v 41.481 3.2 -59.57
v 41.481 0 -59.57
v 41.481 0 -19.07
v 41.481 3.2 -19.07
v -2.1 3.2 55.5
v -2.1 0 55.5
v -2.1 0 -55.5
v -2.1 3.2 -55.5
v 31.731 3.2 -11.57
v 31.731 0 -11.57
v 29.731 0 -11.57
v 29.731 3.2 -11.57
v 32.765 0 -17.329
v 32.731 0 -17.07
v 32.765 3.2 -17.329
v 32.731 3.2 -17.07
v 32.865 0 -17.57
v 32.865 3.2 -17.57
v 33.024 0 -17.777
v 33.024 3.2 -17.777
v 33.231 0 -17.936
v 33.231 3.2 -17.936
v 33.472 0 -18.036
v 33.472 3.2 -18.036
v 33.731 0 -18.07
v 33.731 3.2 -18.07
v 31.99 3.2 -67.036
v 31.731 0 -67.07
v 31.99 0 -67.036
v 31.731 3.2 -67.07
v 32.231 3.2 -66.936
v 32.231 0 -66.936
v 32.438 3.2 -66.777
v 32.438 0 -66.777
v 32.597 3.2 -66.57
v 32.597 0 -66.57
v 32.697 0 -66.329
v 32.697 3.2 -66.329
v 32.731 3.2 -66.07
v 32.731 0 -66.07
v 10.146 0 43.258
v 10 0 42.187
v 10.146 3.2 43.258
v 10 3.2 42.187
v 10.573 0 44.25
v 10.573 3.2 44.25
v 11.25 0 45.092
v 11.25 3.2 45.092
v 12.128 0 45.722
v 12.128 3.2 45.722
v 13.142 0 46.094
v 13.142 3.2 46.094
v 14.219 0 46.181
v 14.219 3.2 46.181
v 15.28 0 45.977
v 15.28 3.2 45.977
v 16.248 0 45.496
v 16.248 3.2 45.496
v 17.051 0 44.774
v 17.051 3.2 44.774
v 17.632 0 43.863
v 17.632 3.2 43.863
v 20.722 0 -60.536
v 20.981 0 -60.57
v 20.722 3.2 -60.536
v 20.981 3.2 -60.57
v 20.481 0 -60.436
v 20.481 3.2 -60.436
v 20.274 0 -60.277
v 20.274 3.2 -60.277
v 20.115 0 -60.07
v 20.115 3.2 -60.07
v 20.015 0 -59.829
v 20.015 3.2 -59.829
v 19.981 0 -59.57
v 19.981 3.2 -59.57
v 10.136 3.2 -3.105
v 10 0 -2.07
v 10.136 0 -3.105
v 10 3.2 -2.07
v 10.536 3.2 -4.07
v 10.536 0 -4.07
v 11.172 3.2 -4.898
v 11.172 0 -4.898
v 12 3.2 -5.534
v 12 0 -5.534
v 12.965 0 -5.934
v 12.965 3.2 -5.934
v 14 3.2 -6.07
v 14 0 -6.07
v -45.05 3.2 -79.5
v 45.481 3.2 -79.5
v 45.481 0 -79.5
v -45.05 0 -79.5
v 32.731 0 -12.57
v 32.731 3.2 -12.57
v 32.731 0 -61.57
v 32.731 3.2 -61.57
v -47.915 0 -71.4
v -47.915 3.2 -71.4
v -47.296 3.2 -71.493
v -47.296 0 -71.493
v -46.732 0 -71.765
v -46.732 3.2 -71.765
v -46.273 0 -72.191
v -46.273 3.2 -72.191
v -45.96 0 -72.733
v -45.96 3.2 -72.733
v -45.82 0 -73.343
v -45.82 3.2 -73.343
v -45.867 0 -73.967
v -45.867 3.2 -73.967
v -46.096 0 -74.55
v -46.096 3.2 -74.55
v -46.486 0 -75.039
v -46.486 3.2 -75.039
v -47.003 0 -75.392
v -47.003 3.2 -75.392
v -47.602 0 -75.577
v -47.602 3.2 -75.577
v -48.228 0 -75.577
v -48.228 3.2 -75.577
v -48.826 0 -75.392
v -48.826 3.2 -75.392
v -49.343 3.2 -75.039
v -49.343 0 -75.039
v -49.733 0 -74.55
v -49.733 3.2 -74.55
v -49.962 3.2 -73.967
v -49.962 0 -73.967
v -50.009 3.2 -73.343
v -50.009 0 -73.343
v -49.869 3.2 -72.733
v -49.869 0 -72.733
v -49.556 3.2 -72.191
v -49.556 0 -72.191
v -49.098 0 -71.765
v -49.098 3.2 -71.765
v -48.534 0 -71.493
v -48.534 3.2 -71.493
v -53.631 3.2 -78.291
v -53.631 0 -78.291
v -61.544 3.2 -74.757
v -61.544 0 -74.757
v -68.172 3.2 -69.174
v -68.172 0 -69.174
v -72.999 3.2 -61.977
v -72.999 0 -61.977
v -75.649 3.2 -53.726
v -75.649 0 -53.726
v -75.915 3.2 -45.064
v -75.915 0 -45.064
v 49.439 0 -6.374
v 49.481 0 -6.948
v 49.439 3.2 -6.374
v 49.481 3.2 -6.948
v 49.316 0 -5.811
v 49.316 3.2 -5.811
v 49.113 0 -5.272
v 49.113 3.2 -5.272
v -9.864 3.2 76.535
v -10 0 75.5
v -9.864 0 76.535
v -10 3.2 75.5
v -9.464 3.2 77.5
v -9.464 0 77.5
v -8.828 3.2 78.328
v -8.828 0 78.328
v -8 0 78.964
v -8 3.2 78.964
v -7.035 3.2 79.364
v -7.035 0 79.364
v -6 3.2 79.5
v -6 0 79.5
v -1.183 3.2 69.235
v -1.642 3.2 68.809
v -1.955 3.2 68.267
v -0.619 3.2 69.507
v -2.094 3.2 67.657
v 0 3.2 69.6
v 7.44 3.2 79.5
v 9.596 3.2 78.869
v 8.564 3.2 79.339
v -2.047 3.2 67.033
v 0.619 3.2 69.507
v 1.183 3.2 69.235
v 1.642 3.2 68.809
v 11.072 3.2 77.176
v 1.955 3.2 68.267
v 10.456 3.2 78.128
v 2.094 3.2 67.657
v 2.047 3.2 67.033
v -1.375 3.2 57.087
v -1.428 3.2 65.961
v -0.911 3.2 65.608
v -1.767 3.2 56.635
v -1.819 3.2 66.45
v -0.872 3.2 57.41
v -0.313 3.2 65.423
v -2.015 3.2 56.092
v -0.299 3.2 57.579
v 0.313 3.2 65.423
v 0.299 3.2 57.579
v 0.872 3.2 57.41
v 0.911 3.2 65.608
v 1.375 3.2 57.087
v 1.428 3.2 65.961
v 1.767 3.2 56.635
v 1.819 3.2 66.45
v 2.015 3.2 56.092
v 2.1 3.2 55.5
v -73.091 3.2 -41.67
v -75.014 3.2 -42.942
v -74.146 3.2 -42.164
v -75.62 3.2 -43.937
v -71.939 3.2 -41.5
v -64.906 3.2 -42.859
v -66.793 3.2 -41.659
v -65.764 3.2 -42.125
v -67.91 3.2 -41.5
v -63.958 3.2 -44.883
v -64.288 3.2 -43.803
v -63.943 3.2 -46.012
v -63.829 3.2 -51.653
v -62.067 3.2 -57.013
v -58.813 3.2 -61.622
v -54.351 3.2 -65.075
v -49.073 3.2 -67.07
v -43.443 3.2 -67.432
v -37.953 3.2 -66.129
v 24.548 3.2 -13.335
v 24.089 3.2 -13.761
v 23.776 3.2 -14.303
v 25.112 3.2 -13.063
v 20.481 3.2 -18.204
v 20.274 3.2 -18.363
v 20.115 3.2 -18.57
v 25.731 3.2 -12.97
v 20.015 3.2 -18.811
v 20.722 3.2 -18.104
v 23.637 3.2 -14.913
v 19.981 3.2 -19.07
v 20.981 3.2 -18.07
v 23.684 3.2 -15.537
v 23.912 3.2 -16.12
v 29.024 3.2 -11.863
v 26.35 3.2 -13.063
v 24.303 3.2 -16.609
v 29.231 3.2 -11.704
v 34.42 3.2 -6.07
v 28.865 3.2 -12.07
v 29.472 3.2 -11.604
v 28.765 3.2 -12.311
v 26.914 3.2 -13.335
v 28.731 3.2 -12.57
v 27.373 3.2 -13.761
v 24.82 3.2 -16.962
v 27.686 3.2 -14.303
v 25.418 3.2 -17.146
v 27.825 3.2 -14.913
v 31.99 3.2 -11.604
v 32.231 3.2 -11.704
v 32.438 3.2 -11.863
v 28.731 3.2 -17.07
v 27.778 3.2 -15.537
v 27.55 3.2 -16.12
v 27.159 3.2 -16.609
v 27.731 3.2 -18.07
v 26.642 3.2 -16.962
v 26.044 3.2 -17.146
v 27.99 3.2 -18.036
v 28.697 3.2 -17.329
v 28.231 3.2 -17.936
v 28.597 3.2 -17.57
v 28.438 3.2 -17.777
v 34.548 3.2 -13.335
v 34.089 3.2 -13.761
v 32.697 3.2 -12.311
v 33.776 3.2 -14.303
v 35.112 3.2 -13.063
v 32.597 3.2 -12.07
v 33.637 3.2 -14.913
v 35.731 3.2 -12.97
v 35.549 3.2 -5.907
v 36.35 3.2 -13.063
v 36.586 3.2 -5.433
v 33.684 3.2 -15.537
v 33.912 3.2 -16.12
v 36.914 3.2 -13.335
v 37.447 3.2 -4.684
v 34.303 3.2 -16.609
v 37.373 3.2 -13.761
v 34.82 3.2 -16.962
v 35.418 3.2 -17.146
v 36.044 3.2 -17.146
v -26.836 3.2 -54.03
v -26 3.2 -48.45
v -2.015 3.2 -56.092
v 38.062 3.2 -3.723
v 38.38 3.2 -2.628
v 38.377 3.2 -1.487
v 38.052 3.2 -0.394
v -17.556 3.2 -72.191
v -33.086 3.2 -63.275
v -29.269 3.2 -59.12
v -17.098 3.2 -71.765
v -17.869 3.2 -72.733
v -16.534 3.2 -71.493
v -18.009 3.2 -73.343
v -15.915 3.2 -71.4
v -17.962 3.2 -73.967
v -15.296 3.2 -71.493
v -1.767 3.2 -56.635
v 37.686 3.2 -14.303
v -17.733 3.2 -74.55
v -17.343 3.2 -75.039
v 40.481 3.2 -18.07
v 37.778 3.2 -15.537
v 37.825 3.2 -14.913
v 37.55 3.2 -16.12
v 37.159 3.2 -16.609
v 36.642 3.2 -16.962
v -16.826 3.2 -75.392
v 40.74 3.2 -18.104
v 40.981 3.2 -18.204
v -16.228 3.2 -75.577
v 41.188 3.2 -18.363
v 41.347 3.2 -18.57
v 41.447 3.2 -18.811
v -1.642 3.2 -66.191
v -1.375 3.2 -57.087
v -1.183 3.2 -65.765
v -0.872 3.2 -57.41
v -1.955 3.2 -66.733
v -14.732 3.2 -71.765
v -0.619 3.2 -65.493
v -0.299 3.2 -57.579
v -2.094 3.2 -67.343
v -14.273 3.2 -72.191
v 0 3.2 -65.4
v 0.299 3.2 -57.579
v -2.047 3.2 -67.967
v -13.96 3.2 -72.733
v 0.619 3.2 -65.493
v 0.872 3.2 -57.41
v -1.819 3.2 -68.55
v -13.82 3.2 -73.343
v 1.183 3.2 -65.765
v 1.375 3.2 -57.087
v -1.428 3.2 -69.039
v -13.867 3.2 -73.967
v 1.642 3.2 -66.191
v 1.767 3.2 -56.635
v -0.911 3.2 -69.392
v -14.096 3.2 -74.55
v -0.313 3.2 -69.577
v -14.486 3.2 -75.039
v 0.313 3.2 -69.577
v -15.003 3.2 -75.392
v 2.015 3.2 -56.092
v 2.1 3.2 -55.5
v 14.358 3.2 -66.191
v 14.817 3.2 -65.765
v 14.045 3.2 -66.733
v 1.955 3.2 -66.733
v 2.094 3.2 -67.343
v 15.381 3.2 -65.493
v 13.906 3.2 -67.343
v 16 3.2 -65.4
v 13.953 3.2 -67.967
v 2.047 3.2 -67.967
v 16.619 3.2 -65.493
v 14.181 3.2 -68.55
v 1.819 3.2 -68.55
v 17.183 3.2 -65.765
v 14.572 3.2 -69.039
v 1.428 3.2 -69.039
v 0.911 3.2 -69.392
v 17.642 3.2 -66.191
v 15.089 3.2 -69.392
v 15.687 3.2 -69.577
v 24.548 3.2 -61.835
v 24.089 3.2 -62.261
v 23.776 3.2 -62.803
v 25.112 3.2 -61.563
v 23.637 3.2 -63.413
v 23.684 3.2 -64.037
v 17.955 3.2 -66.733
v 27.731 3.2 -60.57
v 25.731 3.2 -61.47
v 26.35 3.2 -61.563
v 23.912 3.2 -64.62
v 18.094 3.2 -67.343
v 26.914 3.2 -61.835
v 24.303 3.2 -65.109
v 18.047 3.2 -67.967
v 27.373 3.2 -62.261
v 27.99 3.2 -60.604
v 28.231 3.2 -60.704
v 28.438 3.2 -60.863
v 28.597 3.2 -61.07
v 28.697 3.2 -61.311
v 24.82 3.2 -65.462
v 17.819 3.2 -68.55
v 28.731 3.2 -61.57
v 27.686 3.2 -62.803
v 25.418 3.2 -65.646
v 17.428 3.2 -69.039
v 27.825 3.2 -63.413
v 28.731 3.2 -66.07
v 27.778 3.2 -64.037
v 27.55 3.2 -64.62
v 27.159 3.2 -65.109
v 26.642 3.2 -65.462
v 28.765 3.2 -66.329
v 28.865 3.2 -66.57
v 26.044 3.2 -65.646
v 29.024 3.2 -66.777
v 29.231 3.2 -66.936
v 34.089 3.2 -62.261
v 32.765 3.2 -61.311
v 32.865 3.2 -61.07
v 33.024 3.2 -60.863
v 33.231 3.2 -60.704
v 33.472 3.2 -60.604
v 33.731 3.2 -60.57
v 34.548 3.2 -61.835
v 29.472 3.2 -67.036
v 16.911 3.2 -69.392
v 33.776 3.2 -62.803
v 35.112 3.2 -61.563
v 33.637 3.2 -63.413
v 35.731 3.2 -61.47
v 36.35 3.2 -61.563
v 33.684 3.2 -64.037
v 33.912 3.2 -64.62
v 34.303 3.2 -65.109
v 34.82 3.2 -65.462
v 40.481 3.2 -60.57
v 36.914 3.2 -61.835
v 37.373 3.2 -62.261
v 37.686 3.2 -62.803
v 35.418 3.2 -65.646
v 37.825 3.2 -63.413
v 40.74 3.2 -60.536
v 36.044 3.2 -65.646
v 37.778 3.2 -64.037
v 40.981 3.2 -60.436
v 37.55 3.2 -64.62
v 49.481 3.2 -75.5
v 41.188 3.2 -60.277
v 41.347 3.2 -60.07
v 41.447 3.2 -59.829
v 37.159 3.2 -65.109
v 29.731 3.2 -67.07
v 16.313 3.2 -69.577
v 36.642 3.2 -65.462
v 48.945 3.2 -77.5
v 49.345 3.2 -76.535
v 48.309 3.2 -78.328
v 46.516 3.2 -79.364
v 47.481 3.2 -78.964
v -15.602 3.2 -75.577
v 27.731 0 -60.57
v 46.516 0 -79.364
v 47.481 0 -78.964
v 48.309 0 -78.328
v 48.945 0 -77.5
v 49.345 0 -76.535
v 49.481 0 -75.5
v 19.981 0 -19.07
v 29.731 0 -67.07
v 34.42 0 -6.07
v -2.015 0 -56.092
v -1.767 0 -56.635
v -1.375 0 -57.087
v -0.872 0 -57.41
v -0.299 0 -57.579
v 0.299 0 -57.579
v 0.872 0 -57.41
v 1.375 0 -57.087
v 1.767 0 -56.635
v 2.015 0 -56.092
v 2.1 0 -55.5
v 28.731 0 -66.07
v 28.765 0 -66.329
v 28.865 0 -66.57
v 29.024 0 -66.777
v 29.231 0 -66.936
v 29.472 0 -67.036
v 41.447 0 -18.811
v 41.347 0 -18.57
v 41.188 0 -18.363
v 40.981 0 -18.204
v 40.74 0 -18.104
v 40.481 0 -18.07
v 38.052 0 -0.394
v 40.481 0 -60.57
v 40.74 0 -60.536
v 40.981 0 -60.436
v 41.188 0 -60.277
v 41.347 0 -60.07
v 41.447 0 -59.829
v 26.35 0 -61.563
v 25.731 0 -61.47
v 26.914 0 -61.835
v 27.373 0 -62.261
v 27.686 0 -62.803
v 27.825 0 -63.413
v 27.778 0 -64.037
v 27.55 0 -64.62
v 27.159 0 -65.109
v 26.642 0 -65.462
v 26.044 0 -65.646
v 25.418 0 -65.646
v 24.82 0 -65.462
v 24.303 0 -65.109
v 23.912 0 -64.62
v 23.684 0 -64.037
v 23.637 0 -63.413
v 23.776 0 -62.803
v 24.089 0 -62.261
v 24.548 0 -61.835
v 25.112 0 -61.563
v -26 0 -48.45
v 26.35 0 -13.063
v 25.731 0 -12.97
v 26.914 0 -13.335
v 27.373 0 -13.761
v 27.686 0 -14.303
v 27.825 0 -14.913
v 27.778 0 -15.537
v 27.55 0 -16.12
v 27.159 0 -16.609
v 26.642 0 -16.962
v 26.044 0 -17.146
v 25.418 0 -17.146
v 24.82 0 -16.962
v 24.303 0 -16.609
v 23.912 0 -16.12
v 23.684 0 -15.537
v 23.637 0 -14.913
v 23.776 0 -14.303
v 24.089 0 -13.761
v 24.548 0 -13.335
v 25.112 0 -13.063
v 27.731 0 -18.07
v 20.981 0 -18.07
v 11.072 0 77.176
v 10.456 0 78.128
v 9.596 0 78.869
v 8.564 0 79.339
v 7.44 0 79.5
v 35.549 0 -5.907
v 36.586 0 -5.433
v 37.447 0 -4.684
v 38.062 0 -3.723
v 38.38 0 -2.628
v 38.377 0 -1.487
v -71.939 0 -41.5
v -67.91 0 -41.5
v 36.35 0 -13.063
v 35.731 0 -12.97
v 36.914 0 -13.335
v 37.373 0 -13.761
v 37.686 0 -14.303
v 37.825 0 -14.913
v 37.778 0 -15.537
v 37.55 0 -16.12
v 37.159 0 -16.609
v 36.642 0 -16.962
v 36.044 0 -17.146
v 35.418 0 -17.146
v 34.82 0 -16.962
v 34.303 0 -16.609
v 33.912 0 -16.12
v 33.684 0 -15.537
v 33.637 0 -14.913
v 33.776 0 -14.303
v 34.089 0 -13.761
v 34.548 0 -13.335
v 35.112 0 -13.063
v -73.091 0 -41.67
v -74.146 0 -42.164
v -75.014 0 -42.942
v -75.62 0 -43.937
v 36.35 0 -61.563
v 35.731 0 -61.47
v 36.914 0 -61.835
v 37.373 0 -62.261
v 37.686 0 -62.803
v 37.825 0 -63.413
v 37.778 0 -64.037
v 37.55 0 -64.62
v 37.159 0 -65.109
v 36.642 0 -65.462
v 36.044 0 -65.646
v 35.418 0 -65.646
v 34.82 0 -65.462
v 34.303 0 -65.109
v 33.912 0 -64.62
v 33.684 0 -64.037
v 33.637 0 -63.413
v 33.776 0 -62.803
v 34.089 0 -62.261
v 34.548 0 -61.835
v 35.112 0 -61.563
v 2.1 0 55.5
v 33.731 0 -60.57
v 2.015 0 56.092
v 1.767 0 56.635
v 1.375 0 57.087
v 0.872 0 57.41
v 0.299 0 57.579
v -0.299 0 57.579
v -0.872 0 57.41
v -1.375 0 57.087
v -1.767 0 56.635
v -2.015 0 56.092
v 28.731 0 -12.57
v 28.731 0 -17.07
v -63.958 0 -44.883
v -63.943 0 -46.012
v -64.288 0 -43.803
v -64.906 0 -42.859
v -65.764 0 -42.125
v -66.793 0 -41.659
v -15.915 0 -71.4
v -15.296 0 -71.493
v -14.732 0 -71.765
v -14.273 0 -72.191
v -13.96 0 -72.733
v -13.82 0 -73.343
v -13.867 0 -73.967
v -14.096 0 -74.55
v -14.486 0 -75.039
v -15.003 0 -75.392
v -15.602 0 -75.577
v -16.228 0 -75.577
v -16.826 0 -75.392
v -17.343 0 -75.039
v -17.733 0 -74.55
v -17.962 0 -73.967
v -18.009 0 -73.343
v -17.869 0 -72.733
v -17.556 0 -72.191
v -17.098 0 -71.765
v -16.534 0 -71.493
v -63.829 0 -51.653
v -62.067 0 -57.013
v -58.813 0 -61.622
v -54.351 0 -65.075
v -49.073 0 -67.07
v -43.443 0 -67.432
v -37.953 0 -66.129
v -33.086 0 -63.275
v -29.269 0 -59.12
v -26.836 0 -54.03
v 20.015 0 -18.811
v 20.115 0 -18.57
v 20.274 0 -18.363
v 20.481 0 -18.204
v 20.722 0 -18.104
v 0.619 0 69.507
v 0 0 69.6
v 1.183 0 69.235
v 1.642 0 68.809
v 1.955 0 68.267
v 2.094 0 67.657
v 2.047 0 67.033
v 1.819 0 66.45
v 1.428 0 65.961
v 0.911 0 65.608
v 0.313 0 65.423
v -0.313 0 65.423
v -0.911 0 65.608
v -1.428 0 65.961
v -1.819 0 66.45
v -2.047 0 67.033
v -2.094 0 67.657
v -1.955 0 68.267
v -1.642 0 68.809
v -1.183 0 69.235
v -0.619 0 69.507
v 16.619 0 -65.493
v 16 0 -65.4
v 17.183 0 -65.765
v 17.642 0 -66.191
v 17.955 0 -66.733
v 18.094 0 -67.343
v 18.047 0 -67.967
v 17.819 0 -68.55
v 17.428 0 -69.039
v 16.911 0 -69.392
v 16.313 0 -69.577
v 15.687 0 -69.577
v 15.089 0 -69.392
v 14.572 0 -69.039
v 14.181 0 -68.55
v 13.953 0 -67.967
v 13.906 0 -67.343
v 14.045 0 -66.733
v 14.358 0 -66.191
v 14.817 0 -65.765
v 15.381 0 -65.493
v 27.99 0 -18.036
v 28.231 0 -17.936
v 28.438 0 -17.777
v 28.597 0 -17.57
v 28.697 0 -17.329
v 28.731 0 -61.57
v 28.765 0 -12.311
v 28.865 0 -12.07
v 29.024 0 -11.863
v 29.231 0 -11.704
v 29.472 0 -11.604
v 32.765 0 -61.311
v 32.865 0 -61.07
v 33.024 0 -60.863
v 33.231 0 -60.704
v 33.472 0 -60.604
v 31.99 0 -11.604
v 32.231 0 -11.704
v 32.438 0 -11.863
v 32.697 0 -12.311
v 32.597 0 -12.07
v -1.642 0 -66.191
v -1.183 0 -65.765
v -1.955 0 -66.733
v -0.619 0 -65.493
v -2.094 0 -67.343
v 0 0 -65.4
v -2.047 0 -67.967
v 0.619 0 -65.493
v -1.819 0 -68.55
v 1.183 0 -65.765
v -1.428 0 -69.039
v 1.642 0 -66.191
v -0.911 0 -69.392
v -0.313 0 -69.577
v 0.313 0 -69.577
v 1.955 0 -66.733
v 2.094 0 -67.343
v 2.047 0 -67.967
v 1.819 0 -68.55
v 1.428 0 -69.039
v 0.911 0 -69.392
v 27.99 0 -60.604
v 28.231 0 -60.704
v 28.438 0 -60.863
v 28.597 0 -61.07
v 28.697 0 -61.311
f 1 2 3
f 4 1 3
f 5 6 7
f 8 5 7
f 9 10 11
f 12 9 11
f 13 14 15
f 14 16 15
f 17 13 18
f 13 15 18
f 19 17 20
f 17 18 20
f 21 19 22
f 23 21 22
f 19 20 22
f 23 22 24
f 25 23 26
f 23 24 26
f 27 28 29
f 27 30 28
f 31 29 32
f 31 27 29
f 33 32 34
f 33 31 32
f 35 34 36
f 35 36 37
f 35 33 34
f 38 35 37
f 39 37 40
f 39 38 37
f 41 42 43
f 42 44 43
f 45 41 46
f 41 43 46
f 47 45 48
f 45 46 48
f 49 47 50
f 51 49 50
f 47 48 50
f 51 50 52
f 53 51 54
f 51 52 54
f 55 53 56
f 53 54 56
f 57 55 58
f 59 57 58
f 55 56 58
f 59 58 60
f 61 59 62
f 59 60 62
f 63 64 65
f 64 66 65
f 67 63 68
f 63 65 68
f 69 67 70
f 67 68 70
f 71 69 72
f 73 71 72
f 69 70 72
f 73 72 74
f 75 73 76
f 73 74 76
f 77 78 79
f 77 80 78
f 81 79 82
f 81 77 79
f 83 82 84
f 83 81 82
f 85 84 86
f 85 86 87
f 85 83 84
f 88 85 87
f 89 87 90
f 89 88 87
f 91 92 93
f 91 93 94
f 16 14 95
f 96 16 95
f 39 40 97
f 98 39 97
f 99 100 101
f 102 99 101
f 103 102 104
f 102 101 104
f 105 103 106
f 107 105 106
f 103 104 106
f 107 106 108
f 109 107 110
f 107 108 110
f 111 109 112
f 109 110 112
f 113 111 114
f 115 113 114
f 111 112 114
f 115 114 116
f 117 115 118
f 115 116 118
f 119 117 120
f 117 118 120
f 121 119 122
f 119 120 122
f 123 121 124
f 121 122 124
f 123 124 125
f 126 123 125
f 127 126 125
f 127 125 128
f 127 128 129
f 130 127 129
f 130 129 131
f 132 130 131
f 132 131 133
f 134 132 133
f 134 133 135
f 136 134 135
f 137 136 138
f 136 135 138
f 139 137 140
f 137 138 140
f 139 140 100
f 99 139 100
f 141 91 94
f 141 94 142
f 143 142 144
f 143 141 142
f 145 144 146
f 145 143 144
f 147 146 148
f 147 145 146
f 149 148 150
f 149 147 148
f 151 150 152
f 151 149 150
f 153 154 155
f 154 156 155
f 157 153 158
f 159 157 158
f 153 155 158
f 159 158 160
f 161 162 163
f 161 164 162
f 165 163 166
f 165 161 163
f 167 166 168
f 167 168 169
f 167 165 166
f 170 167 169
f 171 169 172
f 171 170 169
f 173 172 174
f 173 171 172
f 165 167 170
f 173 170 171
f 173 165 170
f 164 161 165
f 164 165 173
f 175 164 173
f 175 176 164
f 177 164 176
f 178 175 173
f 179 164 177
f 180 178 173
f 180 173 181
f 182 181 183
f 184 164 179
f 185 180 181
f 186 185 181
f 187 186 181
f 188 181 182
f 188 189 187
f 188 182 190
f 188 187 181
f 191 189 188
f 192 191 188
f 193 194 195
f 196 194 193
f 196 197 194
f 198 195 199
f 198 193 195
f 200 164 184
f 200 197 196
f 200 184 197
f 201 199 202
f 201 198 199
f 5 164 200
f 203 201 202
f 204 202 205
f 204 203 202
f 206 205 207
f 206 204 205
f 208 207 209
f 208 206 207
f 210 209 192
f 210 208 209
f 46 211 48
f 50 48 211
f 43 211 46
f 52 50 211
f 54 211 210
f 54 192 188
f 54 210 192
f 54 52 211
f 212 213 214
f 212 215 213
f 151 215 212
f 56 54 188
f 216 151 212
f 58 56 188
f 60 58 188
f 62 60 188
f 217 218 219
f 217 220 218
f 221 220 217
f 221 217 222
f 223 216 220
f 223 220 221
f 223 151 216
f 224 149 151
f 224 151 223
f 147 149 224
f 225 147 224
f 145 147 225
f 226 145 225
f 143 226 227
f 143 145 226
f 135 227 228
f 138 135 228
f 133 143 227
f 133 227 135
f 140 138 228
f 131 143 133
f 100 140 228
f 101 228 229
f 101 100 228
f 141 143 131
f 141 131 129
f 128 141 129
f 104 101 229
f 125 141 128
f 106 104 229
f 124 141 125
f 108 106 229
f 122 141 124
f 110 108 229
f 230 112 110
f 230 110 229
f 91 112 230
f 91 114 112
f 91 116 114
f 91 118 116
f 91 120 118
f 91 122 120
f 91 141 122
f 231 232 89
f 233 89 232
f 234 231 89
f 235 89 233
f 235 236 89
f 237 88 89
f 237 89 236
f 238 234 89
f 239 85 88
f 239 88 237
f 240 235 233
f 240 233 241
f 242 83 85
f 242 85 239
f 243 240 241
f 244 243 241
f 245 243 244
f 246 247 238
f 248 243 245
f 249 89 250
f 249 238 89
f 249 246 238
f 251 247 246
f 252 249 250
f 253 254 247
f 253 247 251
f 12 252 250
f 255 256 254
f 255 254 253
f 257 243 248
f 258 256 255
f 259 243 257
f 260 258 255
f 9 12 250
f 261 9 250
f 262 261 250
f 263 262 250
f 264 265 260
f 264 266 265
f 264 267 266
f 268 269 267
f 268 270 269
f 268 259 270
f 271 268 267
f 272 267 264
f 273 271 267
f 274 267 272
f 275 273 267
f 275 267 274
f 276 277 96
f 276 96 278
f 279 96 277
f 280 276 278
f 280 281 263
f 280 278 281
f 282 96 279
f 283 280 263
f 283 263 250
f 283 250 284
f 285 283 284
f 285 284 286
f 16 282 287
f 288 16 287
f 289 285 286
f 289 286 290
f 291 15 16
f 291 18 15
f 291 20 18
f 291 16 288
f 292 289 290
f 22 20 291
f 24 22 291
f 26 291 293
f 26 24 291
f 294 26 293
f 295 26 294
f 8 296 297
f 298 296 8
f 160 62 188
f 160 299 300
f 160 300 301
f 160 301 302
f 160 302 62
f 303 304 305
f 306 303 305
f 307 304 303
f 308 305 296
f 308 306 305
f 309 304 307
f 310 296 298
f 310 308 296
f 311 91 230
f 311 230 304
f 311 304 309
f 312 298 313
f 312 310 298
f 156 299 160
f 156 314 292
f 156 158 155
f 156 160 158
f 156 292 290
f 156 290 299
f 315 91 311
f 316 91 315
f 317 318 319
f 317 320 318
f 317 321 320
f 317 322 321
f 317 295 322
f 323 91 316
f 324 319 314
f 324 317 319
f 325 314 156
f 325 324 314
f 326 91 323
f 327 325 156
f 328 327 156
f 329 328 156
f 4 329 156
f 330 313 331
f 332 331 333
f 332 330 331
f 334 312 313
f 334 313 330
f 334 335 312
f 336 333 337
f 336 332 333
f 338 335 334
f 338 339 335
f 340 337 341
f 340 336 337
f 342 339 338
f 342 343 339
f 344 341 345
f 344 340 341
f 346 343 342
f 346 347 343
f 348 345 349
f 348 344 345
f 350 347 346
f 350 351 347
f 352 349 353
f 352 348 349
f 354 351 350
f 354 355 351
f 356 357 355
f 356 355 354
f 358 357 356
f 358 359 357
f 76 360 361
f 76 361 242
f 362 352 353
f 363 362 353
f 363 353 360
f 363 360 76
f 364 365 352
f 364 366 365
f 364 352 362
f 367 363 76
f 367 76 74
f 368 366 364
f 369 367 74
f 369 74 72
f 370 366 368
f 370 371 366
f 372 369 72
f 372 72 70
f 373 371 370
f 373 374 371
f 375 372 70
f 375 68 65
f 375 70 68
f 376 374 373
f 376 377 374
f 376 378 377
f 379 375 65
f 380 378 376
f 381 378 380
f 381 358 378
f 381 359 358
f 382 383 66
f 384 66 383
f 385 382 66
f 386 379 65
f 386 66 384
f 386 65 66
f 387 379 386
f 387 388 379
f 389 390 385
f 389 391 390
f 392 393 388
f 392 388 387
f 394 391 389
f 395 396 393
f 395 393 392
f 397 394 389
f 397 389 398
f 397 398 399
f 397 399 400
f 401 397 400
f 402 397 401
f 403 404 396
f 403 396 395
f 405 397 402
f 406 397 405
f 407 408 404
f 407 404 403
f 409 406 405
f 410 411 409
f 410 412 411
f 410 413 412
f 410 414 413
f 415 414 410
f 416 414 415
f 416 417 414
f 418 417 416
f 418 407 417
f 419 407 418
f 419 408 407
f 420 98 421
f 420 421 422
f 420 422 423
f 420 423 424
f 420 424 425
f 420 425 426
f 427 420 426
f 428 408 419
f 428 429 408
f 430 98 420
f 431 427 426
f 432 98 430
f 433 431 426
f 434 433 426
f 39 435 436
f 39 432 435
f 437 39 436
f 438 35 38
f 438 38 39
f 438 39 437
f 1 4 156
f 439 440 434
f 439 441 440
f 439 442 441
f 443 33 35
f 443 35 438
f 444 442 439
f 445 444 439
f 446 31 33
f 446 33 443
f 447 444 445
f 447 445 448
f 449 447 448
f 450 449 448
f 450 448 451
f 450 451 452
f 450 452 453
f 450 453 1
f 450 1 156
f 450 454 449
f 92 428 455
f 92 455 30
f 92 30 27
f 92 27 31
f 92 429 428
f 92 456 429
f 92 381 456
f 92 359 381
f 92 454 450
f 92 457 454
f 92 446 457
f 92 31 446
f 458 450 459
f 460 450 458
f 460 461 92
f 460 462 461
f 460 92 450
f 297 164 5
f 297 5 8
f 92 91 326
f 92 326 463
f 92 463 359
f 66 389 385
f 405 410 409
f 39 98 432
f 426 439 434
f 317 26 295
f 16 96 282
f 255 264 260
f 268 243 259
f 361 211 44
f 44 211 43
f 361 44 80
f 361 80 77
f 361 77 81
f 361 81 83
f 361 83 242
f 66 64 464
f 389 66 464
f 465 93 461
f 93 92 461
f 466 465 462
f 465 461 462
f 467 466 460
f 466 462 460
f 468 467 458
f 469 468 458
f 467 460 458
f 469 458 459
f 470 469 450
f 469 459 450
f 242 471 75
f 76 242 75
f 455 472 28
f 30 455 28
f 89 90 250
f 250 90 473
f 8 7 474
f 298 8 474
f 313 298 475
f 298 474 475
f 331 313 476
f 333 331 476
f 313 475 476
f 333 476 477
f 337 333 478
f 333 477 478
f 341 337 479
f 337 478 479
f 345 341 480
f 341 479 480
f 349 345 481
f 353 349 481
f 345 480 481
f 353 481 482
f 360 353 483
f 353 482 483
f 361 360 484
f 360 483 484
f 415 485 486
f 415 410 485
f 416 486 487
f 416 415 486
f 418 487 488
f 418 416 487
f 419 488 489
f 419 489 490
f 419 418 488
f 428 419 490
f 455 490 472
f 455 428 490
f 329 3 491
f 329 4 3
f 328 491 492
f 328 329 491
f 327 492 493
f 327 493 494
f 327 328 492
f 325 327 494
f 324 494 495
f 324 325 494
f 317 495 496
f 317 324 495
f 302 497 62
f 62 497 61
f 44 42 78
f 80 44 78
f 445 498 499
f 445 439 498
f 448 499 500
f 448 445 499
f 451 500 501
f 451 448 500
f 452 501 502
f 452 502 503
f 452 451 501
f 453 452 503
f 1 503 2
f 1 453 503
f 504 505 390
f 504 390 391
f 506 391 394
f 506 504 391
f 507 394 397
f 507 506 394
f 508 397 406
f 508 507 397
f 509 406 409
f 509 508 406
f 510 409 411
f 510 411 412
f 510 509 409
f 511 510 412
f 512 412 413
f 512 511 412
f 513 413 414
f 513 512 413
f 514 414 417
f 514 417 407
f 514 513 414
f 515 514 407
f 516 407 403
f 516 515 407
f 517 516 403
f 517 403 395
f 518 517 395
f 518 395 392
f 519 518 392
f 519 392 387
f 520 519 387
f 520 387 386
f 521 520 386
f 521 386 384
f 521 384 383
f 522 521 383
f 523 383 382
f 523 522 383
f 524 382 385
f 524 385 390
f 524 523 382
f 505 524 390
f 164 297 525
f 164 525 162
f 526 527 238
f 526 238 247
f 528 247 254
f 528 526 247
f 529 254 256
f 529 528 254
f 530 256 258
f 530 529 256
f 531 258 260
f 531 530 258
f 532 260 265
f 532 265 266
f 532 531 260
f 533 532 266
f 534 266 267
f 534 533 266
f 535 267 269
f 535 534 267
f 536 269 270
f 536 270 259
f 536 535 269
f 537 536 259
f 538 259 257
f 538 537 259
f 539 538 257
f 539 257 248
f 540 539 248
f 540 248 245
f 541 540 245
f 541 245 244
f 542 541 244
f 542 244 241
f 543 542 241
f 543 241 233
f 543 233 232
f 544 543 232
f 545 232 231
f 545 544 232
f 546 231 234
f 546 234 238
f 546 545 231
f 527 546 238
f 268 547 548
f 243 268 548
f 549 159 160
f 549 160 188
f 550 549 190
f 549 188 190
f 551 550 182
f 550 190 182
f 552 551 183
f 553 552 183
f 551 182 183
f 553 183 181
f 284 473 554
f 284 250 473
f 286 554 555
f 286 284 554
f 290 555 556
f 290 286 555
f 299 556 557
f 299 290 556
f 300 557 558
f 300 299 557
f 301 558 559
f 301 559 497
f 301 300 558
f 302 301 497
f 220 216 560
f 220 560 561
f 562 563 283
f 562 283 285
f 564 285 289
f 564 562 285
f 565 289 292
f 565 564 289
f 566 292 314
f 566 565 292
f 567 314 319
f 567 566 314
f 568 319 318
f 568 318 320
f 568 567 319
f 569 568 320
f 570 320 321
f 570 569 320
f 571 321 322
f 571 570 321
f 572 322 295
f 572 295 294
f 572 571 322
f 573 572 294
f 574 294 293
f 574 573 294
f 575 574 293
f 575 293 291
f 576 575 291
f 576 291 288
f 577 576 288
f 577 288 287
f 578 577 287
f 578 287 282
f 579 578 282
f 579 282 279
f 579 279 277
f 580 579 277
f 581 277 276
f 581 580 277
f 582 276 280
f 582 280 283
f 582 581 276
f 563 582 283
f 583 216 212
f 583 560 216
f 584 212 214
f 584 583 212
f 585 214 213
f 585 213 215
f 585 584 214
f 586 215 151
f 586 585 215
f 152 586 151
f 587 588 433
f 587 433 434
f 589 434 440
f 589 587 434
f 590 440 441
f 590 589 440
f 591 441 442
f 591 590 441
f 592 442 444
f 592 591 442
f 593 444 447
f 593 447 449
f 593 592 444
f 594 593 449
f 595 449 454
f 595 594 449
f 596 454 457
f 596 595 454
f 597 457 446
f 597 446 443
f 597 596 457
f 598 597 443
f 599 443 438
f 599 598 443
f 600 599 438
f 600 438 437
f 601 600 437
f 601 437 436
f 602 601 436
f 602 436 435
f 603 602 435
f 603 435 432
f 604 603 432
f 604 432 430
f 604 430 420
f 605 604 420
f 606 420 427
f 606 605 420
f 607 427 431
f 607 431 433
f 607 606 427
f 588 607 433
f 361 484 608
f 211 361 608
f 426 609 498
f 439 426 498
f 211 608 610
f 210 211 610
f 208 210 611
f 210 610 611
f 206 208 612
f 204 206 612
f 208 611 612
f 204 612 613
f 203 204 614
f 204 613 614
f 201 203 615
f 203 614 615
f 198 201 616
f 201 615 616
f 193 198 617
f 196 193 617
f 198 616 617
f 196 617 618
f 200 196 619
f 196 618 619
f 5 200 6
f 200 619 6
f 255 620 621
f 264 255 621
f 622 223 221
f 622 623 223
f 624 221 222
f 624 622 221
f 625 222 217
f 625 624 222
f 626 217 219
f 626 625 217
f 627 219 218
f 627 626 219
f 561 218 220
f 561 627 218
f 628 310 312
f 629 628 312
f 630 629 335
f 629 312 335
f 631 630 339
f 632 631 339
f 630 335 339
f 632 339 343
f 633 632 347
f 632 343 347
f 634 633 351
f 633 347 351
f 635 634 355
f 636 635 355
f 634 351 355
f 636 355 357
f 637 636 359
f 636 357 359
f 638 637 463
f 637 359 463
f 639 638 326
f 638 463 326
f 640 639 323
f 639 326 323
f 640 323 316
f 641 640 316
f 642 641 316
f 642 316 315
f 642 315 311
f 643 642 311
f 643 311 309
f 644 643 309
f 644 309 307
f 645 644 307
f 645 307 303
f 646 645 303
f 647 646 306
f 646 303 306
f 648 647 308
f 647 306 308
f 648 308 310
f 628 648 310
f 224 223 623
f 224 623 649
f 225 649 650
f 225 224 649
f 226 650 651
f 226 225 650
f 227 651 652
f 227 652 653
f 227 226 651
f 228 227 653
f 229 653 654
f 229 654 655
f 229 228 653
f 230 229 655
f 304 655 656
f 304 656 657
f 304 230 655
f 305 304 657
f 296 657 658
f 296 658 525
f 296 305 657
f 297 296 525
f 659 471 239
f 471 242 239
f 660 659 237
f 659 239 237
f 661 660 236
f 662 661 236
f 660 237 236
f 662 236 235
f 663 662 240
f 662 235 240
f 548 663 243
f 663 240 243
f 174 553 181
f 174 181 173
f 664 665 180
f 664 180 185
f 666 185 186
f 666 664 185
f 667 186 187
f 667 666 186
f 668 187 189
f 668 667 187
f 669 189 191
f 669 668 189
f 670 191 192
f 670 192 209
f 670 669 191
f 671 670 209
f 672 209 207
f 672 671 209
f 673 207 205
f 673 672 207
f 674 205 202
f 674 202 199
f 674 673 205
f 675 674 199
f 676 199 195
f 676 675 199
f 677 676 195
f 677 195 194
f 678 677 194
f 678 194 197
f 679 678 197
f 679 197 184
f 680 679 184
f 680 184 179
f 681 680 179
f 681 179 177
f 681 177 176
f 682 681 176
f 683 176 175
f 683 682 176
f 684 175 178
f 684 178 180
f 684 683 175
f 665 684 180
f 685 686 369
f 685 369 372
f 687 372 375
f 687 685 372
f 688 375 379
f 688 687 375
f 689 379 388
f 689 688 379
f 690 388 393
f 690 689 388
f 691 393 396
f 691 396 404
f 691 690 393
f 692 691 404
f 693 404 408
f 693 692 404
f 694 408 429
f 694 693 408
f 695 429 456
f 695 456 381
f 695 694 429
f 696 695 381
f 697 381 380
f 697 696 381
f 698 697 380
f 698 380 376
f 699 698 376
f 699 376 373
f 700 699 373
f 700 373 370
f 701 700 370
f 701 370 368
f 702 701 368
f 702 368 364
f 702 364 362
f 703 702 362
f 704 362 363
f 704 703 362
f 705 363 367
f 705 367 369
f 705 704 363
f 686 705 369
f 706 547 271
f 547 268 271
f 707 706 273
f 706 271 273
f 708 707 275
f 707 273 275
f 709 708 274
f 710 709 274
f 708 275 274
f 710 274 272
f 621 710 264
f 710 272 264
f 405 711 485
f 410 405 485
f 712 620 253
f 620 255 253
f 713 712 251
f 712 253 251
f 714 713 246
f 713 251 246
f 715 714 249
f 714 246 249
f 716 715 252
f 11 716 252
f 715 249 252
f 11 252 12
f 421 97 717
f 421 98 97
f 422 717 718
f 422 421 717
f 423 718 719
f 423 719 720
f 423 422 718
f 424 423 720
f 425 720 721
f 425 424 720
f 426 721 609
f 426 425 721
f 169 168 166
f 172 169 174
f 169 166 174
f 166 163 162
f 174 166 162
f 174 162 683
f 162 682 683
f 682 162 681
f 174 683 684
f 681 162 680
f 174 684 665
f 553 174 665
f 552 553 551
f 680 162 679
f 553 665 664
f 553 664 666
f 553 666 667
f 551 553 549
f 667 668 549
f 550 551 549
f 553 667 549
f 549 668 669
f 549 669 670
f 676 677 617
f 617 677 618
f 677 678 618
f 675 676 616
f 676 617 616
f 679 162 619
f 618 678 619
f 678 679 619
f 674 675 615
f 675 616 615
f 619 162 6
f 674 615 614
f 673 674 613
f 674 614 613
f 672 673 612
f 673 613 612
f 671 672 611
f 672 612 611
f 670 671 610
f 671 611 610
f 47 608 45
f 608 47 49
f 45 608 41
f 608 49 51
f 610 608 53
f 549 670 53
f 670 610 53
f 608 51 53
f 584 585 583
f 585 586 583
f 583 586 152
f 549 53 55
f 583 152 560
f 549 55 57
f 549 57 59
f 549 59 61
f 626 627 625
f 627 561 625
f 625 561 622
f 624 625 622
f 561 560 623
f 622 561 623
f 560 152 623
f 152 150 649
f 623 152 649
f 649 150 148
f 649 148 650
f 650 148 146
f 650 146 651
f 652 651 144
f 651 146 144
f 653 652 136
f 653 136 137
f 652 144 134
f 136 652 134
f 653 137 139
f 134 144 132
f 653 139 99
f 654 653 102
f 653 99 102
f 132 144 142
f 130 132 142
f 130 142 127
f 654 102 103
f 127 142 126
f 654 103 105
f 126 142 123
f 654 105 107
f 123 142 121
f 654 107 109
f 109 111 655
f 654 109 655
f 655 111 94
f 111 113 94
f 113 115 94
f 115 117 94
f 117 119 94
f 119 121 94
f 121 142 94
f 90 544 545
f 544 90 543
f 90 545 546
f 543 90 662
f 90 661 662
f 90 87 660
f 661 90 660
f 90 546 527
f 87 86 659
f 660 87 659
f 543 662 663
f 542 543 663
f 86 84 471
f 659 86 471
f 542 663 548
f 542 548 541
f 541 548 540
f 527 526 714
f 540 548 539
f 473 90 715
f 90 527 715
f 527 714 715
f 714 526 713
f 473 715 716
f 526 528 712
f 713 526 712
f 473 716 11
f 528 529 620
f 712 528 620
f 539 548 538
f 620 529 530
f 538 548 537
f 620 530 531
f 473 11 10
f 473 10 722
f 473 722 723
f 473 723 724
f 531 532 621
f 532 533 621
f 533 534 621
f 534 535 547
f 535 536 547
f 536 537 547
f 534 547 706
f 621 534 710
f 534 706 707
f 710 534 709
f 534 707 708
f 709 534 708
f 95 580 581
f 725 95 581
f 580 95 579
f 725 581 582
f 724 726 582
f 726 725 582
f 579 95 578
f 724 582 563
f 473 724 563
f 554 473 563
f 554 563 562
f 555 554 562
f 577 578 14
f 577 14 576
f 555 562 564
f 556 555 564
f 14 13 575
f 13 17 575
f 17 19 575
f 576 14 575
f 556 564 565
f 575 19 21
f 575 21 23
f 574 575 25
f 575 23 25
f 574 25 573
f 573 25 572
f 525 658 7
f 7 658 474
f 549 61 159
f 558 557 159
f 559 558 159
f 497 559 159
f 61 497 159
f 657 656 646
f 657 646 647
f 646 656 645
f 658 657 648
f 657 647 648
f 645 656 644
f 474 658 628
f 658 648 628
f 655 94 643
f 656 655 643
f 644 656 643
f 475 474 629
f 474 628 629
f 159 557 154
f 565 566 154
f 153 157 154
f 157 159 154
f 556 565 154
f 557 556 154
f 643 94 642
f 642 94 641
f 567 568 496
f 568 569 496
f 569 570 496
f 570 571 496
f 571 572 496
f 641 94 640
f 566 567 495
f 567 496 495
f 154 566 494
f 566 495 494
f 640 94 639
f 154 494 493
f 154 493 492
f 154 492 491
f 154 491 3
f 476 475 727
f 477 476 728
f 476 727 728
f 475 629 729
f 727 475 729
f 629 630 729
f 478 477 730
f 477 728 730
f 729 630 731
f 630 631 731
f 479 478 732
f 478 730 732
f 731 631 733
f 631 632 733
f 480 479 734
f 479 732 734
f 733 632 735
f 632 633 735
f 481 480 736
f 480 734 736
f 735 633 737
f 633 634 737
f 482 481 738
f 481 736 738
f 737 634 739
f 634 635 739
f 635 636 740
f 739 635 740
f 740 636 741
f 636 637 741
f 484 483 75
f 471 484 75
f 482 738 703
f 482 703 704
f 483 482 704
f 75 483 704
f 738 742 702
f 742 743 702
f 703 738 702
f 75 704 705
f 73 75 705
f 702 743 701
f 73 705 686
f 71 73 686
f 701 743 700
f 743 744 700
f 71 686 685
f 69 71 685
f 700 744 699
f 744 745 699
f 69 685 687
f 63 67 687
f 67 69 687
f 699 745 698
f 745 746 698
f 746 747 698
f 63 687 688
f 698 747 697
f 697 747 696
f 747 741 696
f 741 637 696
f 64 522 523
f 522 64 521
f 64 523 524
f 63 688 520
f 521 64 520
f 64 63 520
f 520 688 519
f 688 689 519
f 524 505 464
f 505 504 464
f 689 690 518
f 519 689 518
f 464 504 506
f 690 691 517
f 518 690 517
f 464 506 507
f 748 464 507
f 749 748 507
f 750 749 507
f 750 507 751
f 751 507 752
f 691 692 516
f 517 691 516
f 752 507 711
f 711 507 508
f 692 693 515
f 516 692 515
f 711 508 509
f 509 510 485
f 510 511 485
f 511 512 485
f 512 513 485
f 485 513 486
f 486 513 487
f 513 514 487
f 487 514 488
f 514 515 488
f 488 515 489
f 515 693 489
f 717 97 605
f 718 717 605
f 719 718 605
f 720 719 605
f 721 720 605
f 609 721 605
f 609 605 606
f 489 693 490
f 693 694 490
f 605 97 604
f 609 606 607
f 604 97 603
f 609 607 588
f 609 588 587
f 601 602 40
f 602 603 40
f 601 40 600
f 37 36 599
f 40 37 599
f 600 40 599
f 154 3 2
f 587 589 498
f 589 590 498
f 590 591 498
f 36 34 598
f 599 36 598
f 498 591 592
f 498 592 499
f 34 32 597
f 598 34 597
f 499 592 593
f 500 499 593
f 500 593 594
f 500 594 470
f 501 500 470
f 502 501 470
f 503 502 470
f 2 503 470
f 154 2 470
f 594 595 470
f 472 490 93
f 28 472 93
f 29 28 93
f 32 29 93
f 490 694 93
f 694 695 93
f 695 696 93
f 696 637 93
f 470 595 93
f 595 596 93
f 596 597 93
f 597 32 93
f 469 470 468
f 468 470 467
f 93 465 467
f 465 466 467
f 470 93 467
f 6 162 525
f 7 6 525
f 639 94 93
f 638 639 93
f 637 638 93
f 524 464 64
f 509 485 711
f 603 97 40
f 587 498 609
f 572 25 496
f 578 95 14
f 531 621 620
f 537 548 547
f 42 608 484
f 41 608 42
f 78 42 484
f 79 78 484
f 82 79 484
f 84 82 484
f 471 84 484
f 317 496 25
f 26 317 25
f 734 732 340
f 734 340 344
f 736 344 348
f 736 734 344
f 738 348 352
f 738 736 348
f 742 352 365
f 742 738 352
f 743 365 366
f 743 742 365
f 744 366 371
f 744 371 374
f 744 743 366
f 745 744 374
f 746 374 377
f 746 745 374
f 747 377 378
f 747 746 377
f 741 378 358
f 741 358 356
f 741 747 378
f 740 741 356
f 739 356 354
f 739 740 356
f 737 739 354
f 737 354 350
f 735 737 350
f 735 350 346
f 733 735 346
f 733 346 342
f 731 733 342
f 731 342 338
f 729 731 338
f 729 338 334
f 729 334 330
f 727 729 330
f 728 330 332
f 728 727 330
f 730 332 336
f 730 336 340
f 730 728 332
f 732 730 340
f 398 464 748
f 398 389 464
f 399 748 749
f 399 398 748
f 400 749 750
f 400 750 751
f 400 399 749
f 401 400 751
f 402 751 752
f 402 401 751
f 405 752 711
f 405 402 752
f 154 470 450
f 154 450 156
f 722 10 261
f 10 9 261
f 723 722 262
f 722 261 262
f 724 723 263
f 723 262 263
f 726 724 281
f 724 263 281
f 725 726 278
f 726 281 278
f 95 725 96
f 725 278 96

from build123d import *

# Parameters (mm, degrees)
SKETCH1_R           = 2.1
BOSS_EXTRUDE1_DEPTH = 3.2
FILLET1_R           = 4
FILLET2_R           = 1
SKETCH2_R           = 2.1
BOSS_EXTRUDE2_DEPTH = 3.2
FILLET3_R           = 4


with BuildPart() as part:
    # Sketch1 → Boss-Extrude1 (new body)
    with BuildSketch(Plane(origin=(0, 0, 0), x_dir=(1, 0, 0), z_dir=(0, 1, 0))):
        Polygon((10, 79.5), (49.480867985, 79.5), (49.480867985, 6.069914218), (10, -79.5), (-10, -79.5), (-10, 79.5), align=None)
        with Locations(Location((0, 67.5, 0), (0, 0, 270))):
            Circle(SKETCH1_R, mode=Mode.SUBTRACT)
        with Locations(Location((0, -67.5, 0), (0, 0, 270))):
            Circle(SKETCH1_R, mode=Mode.SUBTRACT)
        with Locations(Location((35.730867985, 63.569914218, 0), (0, 0, 270))):
            Circle(SKETCH1_R, mode=Mode.SUBTRACT)
        with Locations(Location((25.730867985, 63.569914218, 0), (0, 0, 270))):
            Circle(SKETCH1_R, mode=Mode.SUBTRACT)
        with Locations(Location((25.730867985, 15.069914218, 0), (0, 0, 270))):
            Circle(SKETCH1_R, mode=Mode.SUBTRACT)
        with Locations(Location((35.730867985, 15.069914218, 0), (0, 0, 270))):
            Circle(SKETCH1_R, mode=Mode.SUBTRACT)
        with Locations(Location((16, 67.5, 0), (0, 0, 270))):
            Circle(SKETCH1_R, mode=Mode.SUBTRACT)
        Polygon((19.980867985, 60.569914218), (28.730867985, 60.569914218), (28.730867985, 67.069914218), (32.730867985, 67.069914218), (32.730867985, 60.569914218), (41.480867985, 60.569914218), (41.480867985, 18.069914218), (32.730867985, 18.069914218), (32.730867985, 11.569914218), (28.730867985, 11.569914218), (28.730867985, 18.069914218), (19.980867985, 18.069914218), align=None, mode=Mode.SUBTRACT)
        with BuildLine():
            Line((-2.1, -55.5), (-2.1, 55.5))
            ThreePointArc((-2.1, 55.5), (0, 57.6), (2.1, 55.5))
            Line((2.1, 55.5), (2.1, -55.5))
            ThreePointArc((2.1, -55.5), (0, -57.6), (-2.1, -55.5))
        make_face(mode=Mode.SUBTRACT)
        Polygon((10, -60.404414159), (10, 6.069914218), (40.670408017, 6.069914218), align=None, mode=Mode.SUBTRACT)
    extrude(amount=BOSS_EXTRUDE1_DEPTH)

    # Fillet1
    fillet1_edges = [part.edges().sort_by_distance(p)[0] for p in [
        (-10, 1.6, -79.5),
        (49.480867985, 1.6, -79.5),
        (49.480867985, 1.6, -6.069914218),
        (10, 1.6, 79.5),
        (-10, 1.6, 79.5),
        (10, 1.6, 60.404414159),
        (40.670408017, 1.6, -6.069914218),
        (10, 1.6, -6.069914218),
    ]]
    fillet(fillet1_edges, radius=FILLET1_R)

    # Fillet2
    fillet2_edges = [part.edges().sort_by_distance(p)[0] for p in [
        (32.730867985, 1.6, -18.069914218),
        (41.480867985, 1.6, -18.069914218),
        (41.480867985, 1.6, -60.569914218),
        (32.730867985, 1.6, -60.569914218),
        (32.730867985, 1.6, -67.069914218),
        (28.730867985, 1.6, -67.069914218),
        (28.730867985, 1.6, -60.569914218),
        (19.980867985, 1.6, -60.569914218),
        (19.980867985, 1.6, -18.069914218),
        (28.730867985, 1.6, -18.069914218),
        (28.730867985, 1.6, -11.569914218),
        (32.730867985, 1.6, -11.569914218),
    ]]
    fillet(fillet2_edges, radius=FILLET2_R)

    # Sketch2 → Boss-Extrude2 (add)
    with BuildSketch(Plane(origin=(0, 3.2, 0), x_dir=(1, 0, 0), z_dir=(0, 1, 0))):
        with BuildLine():
            Line((-6, 79.5), (-45.05, 79.5))
            ThreePointArc((-45.05, 79.5), (-69.338886347, 67.793021998), (-75.312187627, 41.5))
            Line((-75.312187627, 41.5), (-62.786967046, 41.5))
            ThreePointArc((-62.786967046, 41.5), (-48.586472661, 67.168863777), (-26, 48.45))
            Line((-26, 48.45), (-10, -75.5))
            Line((-10, -75.5), (-10, 75.5))
            ThreePointArc((-10, 75.5), (-8.828427125, 78.328427125), (-6, 79.5))
        make_face()
        with Locations(Location((-47.914568138, 73.5, 0), (0, 0, 270))):
            Circle(SKETCH2_R, mode=Mode.SUBTRACT)
        with Locations(Location((-15.914568138, 73.5, 0), (0, 0, 270))):
            Circle(SKETCH2_R, mode=Mode.SUBTRACT)
    extrude(amount=-BOSS_EXTRUDE2_DEPTH)

    # Fillet3
    fillet3_edges = [part.edges().sort_by_distance(p)[0] for p in [
        (-62.786967046, 1.6, -41.5),
        (-75.312187627, 1.6, -41.5),
    ]]
    fillet(fillet3_edges, radius=FILLET3_R)


solid = part.part
